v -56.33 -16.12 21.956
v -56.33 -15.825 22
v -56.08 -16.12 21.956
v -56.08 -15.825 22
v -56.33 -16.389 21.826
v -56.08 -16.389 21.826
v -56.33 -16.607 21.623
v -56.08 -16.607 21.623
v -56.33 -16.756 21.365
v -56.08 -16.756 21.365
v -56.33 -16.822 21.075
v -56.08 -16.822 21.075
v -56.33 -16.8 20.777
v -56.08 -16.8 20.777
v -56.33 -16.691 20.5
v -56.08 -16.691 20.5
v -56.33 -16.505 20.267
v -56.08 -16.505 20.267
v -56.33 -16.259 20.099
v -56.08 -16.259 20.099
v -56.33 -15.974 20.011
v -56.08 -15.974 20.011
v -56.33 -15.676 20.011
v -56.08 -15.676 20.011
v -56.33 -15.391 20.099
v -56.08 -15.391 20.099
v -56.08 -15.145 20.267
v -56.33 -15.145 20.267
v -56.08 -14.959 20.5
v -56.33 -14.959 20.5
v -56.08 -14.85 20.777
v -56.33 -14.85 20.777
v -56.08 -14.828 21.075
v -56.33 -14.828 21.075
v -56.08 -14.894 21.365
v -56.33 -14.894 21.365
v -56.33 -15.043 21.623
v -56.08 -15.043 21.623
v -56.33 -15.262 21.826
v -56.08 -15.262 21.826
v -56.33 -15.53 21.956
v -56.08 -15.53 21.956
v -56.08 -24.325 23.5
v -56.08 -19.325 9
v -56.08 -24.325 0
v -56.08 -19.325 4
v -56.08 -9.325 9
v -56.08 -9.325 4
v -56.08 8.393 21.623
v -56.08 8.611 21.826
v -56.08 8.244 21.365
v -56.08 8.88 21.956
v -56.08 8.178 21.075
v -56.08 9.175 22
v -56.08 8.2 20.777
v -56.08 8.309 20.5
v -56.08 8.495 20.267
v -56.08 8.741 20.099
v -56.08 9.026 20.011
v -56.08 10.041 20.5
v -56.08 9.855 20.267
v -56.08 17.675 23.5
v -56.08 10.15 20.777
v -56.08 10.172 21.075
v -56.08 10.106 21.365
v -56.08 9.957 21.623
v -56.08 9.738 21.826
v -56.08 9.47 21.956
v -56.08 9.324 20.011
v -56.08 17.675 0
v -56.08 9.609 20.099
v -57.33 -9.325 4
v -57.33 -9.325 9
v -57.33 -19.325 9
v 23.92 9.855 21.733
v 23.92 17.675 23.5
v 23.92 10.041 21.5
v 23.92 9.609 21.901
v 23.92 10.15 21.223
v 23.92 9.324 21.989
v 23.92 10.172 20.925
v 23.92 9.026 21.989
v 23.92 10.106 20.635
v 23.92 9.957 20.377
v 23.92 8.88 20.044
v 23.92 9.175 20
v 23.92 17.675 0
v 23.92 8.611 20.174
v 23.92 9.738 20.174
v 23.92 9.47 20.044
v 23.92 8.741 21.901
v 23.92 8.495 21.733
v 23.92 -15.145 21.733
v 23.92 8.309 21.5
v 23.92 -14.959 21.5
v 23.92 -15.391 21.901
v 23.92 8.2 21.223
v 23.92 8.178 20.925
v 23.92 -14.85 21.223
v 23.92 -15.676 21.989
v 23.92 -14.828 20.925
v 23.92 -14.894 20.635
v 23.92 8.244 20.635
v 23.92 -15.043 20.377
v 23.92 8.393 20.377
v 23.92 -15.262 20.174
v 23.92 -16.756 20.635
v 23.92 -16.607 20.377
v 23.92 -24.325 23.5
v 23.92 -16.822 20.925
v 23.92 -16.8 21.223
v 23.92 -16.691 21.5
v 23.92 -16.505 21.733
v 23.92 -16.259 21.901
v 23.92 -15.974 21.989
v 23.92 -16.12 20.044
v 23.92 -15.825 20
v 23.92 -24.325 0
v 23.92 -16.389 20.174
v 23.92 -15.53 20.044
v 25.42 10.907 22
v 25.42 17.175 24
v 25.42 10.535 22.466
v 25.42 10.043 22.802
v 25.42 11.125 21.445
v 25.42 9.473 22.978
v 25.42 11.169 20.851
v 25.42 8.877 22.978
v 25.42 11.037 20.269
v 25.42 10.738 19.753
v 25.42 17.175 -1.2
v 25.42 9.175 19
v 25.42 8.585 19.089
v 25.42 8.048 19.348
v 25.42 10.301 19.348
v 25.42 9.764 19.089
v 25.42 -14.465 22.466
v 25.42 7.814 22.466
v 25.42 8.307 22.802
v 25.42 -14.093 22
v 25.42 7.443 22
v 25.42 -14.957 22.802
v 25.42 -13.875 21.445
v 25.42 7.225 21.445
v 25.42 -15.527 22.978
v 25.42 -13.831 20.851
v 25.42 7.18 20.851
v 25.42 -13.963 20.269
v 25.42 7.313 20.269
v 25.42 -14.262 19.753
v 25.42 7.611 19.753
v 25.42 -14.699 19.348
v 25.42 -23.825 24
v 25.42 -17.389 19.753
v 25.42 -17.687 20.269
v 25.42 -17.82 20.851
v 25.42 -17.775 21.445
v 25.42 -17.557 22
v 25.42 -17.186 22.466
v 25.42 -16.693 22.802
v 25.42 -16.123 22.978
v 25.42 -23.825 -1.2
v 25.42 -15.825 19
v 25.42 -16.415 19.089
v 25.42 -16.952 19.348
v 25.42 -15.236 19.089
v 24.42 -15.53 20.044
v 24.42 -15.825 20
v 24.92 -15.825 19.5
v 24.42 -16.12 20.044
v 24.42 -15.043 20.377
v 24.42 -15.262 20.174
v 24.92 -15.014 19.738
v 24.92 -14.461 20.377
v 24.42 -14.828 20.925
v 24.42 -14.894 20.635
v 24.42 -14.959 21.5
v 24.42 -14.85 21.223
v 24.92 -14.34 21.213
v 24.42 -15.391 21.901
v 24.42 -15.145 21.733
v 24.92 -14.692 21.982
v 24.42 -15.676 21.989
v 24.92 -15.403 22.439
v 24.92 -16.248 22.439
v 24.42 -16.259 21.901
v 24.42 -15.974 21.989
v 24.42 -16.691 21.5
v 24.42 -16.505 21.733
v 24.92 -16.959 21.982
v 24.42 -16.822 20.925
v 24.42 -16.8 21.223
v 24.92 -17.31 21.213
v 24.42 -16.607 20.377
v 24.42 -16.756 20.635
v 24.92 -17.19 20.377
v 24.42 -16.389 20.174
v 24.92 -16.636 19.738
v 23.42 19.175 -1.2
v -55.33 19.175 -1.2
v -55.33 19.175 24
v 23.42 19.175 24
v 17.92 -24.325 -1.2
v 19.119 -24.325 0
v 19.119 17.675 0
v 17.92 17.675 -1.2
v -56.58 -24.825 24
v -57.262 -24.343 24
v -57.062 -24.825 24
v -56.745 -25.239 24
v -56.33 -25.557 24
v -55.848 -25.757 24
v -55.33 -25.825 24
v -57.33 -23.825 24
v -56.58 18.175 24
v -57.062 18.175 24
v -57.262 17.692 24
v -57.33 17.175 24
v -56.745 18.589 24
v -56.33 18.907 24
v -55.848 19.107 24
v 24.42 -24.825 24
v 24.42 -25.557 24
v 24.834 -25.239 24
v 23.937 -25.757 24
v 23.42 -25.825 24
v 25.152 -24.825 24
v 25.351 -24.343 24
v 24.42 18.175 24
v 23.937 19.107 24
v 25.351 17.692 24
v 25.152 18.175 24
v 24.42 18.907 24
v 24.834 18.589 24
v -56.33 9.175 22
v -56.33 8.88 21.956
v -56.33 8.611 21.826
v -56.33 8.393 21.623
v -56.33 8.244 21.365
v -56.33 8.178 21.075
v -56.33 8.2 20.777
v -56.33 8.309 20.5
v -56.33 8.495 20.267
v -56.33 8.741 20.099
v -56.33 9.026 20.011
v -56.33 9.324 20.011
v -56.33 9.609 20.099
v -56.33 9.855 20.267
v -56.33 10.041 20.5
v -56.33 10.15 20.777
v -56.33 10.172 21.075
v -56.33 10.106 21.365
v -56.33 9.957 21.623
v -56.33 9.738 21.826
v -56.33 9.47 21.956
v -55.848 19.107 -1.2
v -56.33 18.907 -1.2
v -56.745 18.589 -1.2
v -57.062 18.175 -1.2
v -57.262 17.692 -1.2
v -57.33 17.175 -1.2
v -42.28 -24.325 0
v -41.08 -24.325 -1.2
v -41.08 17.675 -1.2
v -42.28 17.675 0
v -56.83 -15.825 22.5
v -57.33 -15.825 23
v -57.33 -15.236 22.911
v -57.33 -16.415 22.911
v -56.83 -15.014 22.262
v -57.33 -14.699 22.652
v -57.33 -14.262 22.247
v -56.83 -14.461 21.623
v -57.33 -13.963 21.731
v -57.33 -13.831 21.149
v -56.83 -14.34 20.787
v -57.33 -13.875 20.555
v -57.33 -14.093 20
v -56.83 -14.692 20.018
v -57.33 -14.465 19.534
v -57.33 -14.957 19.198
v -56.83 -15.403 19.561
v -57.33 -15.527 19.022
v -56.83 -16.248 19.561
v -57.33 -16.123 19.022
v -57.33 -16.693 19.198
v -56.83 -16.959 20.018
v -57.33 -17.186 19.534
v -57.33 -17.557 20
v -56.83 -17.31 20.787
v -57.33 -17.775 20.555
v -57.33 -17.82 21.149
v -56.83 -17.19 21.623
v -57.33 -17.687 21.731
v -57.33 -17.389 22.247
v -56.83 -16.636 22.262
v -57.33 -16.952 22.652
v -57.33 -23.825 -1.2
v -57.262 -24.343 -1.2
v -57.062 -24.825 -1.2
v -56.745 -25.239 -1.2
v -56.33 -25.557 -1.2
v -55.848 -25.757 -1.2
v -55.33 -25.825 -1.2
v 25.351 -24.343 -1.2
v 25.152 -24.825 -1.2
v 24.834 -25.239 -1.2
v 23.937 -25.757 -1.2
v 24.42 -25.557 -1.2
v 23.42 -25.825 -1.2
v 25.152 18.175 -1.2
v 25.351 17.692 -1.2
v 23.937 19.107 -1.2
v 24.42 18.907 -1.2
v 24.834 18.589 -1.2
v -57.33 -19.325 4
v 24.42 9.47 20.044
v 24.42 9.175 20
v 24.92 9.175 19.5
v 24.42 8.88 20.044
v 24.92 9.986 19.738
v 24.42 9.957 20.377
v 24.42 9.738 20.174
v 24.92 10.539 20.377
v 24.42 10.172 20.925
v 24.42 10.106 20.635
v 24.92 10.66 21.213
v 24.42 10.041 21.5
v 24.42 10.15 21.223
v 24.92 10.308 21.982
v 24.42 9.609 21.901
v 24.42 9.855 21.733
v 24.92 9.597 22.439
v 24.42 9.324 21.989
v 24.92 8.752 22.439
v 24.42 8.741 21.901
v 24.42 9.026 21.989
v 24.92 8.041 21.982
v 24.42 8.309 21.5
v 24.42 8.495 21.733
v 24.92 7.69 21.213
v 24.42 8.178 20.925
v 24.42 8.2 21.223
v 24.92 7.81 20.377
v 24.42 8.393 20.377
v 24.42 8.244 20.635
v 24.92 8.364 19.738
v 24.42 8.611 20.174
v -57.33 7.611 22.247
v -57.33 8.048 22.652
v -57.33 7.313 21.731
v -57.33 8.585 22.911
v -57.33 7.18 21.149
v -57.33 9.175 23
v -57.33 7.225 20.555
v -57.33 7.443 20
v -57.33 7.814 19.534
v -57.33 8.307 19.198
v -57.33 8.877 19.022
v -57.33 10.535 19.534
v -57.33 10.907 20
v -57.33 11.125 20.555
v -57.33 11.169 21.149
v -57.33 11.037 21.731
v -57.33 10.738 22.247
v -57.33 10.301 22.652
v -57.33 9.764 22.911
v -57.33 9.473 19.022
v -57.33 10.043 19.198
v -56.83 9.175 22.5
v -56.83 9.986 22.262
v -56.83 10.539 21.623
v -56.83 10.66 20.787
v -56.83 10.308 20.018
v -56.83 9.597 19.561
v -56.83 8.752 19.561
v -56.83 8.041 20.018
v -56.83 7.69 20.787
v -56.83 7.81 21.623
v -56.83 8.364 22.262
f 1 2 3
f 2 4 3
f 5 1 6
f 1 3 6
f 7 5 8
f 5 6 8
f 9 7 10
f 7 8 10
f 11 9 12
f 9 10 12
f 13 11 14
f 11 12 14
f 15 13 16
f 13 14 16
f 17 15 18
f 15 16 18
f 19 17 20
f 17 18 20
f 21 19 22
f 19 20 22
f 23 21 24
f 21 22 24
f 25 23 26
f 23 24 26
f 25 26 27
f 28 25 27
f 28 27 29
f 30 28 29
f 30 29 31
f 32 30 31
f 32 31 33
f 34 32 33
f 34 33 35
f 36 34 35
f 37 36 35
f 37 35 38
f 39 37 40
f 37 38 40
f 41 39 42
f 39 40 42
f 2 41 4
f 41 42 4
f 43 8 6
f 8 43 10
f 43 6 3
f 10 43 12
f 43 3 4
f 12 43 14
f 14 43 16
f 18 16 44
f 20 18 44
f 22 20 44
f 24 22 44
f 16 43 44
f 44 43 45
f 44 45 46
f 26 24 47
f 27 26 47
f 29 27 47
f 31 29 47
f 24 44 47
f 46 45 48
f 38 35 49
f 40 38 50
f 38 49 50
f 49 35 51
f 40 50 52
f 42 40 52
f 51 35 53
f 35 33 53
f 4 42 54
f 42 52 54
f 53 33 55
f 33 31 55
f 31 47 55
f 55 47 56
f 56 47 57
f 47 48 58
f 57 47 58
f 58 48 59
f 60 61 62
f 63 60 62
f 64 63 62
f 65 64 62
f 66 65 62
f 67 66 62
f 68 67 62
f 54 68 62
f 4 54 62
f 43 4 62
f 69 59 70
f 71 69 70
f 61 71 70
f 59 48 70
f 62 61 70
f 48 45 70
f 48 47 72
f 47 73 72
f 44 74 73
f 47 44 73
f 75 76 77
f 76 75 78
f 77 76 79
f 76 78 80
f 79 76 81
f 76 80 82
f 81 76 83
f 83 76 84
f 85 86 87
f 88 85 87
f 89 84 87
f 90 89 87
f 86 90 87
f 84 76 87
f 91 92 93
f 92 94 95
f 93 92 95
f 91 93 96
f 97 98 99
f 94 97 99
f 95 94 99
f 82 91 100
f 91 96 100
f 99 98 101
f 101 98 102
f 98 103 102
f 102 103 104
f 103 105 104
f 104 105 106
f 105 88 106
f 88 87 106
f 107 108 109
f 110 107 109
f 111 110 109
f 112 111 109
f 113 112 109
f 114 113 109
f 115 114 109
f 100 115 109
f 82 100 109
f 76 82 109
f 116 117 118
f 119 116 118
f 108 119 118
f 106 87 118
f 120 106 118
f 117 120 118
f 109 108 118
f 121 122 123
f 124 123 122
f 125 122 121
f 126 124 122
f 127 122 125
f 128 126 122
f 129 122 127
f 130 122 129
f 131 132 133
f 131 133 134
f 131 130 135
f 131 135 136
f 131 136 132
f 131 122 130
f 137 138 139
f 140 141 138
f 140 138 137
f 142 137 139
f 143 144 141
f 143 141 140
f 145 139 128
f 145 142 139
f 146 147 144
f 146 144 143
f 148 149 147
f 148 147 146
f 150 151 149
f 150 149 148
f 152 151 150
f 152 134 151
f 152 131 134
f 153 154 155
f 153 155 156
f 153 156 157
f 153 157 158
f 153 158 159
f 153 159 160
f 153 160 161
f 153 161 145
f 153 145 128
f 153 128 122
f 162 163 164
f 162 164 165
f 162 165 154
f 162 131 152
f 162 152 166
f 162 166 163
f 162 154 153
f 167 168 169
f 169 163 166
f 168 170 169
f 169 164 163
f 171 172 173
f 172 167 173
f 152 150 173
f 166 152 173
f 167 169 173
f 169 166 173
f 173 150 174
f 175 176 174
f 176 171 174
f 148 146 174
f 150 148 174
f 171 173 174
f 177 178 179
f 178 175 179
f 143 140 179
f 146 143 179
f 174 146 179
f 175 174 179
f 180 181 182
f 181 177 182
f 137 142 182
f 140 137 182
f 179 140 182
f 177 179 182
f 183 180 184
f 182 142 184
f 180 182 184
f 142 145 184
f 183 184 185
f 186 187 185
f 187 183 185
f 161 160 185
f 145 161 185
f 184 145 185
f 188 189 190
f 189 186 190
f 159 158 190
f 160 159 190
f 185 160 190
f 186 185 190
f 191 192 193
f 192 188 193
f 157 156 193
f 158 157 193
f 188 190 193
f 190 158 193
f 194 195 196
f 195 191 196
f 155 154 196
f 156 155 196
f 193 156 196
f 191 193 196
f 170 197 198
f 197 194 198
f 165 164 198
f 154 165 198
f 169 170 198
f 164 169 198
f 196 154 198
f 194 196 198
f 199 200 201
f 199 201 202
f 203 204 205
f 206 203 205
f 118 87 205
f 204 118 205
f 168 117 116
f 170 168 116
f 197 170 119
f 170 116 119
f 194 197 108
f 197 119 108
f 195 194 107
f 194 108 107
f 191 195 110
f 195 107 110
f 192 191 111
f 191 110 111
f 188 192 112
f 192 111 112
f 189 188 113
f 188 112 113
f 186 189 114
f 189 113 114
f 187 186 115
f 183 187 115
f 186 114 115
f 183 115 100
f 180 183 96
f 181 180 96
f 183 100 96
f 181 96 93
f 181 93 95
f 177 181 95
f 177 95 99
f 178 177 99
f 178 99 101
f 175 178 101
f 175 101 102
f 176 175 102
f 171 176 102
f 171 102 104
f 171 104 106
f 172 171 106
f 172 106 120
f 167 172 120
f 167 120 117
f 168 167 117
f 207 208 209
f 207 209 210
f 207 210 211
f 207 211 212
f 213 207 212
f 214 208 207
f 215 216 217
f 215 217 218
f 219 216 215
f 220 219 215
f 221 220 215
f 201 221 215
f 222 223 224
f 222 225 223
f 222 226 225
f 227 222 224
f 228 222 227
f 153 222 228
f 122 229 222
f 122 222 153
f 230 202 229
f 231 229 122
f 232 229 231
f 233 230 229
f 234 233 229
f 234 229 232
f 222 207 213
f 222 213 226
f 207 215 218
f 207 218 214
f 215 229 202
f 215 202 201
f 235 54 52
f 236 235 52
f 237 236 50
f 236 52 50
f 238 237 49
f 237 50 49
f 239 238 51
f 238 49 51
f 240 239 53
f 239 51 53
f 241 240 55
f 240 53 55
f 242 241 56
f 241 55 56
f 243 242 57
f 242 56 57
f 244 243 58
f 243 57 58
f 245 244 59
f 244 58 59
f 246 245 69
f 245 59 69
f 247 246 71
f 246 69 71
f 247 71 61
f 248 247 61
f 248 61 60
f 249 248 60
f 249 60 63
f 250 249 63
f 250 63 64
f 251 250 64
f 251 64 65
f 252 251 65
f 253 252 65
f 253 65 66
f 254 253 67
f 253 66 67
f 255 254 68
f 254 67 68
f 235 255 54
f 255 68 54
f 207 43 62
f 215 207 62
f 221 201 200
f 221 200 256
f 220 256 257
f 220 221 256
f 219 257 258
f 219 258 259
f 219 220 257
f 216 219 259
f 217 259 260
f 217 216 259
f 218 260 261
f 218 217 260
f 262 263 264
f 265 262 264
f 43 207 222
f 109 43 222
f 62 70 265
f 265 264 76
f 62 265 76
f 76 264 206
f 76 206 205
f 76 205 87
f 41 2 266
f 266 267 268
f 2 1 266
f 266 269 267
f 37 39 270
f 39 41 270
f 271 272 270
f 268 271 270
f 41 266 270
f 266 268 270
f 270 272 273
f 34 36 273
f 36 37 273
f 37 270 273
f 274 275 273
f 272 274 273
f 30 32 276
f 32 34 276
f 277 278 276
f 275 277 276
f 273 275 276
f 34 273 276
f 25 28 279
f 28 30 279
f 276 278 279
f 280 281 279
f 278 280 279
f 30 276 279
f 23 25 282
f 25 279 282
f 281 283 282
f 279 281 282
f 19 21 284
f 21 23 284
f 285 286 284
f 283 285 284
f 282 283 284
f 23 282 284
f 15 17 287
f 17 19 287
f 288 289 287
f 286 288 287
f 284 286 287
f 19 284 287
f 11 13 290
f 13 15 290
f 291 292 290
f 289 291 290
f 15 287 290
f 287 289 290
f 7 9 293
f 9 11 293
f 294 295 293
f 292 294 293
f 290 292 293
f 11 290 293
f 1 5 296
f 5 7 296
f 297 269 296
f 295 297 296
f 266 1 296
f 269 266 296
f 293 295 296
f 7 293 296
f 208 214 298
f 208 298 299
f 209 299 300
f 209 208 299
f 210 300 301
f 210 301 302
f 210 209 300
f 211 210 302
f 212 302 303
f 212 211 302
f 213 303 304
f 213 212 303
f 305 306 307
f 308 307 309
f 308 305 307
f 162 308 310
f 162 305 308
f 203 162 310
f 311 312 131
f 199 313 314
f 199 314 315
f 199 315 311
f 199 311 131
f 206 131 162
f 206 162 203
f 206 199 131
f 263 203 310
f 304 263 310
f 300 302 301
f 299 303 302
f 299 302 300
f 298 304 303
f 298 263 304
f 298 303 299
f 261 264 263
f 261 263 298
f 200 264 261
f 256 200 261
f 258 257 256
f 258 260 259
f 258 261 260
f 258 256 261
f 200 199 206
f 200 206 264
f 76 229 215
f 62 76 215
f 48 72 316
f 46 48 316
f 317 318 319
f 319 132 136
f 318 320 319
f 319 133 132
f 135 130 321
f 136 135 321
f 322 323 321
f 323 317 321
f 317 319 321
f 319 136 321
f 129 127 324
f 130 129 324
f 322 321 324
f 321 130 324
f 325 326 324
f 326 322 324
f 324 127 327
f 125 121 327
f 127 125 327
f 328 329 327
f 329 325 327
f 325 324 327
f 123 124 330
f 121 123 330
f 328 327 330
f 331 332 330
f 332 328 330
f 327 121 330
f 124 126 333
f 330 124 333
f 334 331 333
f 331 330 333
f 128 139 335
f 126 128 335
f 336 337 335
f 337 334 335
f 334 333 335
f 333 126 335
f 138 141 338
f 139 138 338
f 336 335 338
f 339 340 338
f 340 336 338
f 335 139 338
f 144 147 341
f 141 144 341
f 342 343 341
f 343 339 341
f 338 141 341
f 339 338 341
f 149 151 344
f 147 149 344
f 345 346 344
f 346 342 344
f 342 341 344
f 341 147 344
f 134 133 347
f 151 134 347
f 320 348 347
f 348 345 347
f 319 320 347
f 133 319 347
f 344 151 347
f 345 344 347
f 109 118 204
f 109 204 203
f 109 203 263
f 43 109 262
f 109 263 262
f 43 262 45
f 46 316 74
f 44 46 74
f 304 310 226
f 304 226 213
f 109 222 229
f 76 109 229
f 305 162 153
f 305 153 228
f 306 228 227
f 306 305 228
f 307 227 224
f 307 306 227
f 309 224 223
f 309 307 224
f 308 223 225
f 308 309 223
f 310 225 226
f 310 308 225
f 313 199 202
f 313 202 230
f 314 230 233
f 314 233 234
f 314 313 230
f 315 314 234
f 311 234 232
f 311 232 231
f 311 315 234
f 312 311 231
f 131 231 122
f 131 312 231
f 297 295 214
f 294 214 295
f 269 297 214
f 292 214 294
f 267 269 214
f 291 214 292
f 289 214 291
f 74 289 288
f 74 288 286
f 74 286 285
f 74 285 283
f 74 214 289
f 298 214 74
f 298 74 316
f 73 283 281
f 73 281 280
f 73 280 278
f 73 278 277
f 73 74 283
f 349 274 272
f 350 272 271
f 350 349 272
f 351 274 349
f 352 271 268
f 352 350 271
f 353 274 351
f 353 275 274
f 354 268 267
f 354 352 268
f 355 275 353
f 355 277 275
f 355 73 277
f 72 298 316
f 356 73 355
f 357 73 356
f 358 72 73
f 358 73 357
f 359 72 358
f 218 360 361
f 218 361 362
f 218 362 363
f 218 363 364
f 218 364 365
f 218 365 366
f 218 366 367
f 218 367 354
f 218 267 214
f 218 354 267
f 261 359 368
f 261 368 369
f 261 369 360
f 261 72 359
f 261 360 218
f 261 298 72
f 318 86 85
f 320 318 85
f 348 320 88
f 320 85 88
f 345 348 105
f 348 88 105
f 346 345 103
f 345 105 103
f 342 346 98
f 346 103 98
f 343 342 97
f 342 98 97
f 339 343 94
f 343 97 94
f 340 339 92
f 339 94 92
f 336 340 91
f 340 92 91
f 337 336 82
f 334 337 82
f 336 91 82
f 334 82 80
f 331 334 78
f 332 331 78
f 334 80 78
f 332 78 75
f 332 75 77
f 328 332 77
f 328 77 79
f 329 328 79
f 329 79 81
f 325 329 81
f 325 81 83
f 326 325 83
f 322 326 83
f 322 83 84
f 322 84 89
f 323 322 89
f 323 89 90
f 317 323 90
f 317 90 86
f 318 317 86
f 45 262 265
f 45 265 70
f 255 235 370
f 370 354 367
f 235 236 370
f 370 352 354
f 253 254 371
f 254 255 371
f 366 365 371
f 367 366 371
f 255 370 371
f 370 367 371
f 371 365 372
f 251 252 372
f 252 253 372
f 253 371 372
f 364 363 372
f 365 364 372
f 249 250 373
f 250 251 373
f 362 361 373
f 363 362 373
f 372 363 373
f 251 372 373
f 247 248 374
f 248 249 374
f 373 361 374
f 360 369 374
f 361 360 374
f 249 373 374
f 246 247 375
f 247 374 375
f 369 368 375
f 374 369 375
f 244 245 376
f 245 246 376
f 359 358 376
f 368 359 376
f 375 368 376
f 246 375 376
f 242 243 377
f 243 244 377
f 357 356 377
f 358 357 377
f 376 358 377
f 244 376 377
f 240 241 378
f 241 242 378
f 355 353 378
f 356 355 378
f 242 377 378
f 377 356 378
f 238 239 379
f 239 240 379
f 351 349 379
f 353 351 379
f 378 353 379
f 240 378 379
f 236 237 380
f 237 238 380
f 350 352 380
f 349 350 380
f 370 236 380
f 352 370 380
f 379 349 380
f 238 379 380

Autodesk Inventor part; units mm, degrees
ref_plane "YZ Plane" through (0, 0, 0) normal (1, 0, 0) x (0, 1, 0)
ref_plane "XZ Plane" through (0, 0, 0) normal (0, 1, 0) x (-1, 0, 0)
ref_plane "XY Plane" through (0, 0, 0) normal (0, 0, 1) x (1, 0, 0)
sketch "Sketch1" plane through (0, 0, 0) normal (0, 0, 1) x (1, 0, 0)
  line L0 (-56.0804, 17.6748) -> (23.9196, 17.6748)
  line L1 (23.9196, 17.6748) -> (23.9196, -24.3252)
  line L2 (23.9196, -24.3252) -> (-56.0804, -24.3252)
  line L3 (-56.0804, -24.3252) -> (-56.0804, 17.6748)
  line L4 (-57.3304, 19.1748) -> (25.4196, 19.1748)
  line L5 (25.4196, 19.1748) -> (25.4196, -25.8252)
  line L6 (25.4196, -25.8252) -> (-57.3304, -25.8252)
  line L7 (-57.3304, -25.8252) -> (-57.3304, 19.1748)
  point P0 (0, 0)
  dimension "d0" = 80
  dimension "d1" = 42
  dimension "d2" = 1.5
  dimension "d3" = 1.5
  dimension "d4" = 1.25
  dimension "d5" = 1.5
extrude "Extrusion1" add sketch "Sketch1" along normal blind 24
sketch "Sketch2" plane through (0, 0, 0) normal (0, 0, -1) x (-1, 0, 0)
  line L0 (-25.4196, -25.8252) -> (-25.4196, 19.1748) projected
  line L1 (57.3304, -25.8252) -> (-25.4196, -25.8252) projected
  line L2 (-25.4196, 19.1748) -> (57.3304, 19.1748)
  line L3 (57.3304, 19.1748) -> (57.3304, -25.8252)
  line L4 (57.3304, -25.8252) -> (-25.4196, -25.8252)
  line L5 (-25.4196, -25.8252) -> (-25.4196, 19.1748)
  point P0 (0, 0)
extrude "Extrusion2" add sketch "Sketch2" along normal blind 1.2
fillet "Fillet1" radius 2 4 edges at (-57.3304, 19.1748, 11.4) (-57.3304, -25.8252, 11.4) (25.4196, -25.8252, 11.4) (25.4196, 19.1748, 11.4)
sketch "Sketch3" plane through (0, 0, 0) normal (0, 0, 1) x (1, 0, 0)
  line L0 (-56.0804, 17.6748) -> (23.9196, 17.6748) projected
  line L1 (-45.0804, 17.6748) -> (17.9196, 17.6748)
  line L2 (17.9196, 17.6748) -> (17.9196, -24.8955)
  line L3 (17.9196, -24.8955) -> (-45.0804, -24.8955)
  line L4 (-45.0804, -24.8955) -> (-45.0804, 17.6748)
  line L5 (23.9196, 17.6748) -> (23.9196, -24.3252) projected
  point P0 (0, 0)
  point P1 (17.9196, 17.6748)
  dimension "d11" = 6
  dimension "d12" = 69
extrude "Extrusion3" cut sketch "Sketch3" against normal blind 1.2
chamfer "Chamfer1" distance 1.2 angle 45 2 edges at (-45.0804, -3.3252, 0) (17.9196, -3.3252, 0)
sketch "Sketch4" plane through (-57.3304, -23.8252, 24) normal (-1, 0, 0) x (0, 0, 1)
  line L0 (-15, 14.5) -> (-20, 14.5)
  line L1 (-20, 14.5) -> (-20, 4.5)
  line L2 (-20, 4.5) -> (-15, 4.5)
  line L3 (-15, 4.5) -> (-15, 14.5)
  line L4 (-24, -0.5) -> (-24, 41.5) projected
  line L5 (-24, -0.5) -> (0, -0.5) projected
  point P0 (-24, 23.8252)
  dimension "d18" = 4
  dimension "d19" = 5
  dimension "d20" = 10
  dimension "d21" = 5
extrude "Extrusion4" cut sketch "Sketch4" against normal blind 1.5
sketch "Sketch5" plane through (-57.3304, -23.8252, 24) normal (-1, 0, 0) x (0, 0, 1)
  line L0 (0, 43) -> (-25.2, 43) projected
  line L1 (-25.2, -2) -> (0, -2) projected
  line L2 (0, 41) -> (0, 0) projected
  point P0 (-24, 23.8252)
  point P1 (-3, 33)
  point P2 (-3, 8)
  dimension "d24" = 10
  dimension "d25" = 10
  dimension "d26" = 3
  dimension "d27" = 3
hole "Hole1" at (-57.3304, 9.1748, 21) at (-57.3304, -15.8252, 21) direction (1, 0, 0) diameter 2 depth 10 tip angle 179 countersink diameter 4 countersink angle 90
sketch "Sketch6" plane through (25.4196, -23.8252, 24) normal (1, 0, 0) x (0, 0, -1)
  circle A0 centre (3, 8) radius 1 projected
  circle A1 centre (3, 33) radius 1 projected
  point P0 (24, 23.8252)
hole "Hole2" at (25.4196, -15.8252, 21) at (25.4196, 9.1748, 21) direction (-1, 0, 0) diameter 2 depth 10 tip angle 179 countersink diameter 4 countersink angle 90
sketch "Sketch7" plane through (0, 0, -1.2) normal (0, 0, -1) x (-1, 0, 0)
  line L0 (45.0804, -24.8955) -> (-17.9196, -24.8955) projected
  line L1 (-17.9196, -24.3252) -> (-17.9196, 17.6748) projected
  line L2 (45.0804, -24.8955) -> (-17.9196, -24.8955)
  line L3 (-17.9196, -24.8955) -> (-17.9196, -24.3252)
  line L4 (-17.9196, -24.3252) -> (45.0804, -24.3252)
  line L5 (45.0804, -24.3252) -> (45.0804, -24.8955)
  point P0 (0, 0)
extrude "Extrusion5" add sketch "Sketch7" against normal blind 1.5
sketch "Sketch8" plane through (0, 0, -1.2) normal (0, 0, -1) x (-1, 0, 0)
  line L0 (-17.9196, -24.3252) -> (-17.9196, 17.6748) projected
  line L1 (-23.9196, -24.3252) -> (56.0804, -24.3252) projected
  line L2 (-17.9196, 17.6748) -> (41.0804, 17.6748)
  line L3 (41.0804, 17.6748) -> (41.0804, -24.3252)
  line L4 (41.0804, -24.3252) -> (-17.9196, -24.3252)
  line L5 (-17.9196, -24.3252) -> (-17.9196, 17.6748)
  line L6 (-23.9196, 17.6748) -> (-23.9196, -24.3252) projected
  line L7 (46.2804, -24.3252) -> (56.0804, -24.3252) projected
  line L8 (41.0804, 17.6748) -> (56.0804, 17.6748)
  line L9 (56.0804, 17.6748) -> (56.0804, -24.3252)
  line L10 (56.0804, -24.3252) -> (41.0804, -24.3252)
  line L11 (41.0804, -24.3252) -> (41.0804, 17.6748)
  point P0 (0, 0)
  dimension "d44" = 65
extrude "Extrusion6" add sketch "Sketch8" against normal blind 1.2 contours L3 L8 L9 L1
sketch "Sketch9" plane through (0, 0, -1.2) normal (0, 0, -1) x (-1, 0, 0)
  point P0 (0, 0)
chamfer "Chamfer2" distance 0.5 angle 45 4 edges at (-16.0804, 17.6748, 24) (-56.0804, -3.3252, 24) (-16.0804, -24.3252, 24) (23.9196, -3.3252, 24)
chamfer "Chamfer3" distance 1.2 angle 45 1 edges at (-41.0804, -3.3252, 0)
properties part number "screen cover"
